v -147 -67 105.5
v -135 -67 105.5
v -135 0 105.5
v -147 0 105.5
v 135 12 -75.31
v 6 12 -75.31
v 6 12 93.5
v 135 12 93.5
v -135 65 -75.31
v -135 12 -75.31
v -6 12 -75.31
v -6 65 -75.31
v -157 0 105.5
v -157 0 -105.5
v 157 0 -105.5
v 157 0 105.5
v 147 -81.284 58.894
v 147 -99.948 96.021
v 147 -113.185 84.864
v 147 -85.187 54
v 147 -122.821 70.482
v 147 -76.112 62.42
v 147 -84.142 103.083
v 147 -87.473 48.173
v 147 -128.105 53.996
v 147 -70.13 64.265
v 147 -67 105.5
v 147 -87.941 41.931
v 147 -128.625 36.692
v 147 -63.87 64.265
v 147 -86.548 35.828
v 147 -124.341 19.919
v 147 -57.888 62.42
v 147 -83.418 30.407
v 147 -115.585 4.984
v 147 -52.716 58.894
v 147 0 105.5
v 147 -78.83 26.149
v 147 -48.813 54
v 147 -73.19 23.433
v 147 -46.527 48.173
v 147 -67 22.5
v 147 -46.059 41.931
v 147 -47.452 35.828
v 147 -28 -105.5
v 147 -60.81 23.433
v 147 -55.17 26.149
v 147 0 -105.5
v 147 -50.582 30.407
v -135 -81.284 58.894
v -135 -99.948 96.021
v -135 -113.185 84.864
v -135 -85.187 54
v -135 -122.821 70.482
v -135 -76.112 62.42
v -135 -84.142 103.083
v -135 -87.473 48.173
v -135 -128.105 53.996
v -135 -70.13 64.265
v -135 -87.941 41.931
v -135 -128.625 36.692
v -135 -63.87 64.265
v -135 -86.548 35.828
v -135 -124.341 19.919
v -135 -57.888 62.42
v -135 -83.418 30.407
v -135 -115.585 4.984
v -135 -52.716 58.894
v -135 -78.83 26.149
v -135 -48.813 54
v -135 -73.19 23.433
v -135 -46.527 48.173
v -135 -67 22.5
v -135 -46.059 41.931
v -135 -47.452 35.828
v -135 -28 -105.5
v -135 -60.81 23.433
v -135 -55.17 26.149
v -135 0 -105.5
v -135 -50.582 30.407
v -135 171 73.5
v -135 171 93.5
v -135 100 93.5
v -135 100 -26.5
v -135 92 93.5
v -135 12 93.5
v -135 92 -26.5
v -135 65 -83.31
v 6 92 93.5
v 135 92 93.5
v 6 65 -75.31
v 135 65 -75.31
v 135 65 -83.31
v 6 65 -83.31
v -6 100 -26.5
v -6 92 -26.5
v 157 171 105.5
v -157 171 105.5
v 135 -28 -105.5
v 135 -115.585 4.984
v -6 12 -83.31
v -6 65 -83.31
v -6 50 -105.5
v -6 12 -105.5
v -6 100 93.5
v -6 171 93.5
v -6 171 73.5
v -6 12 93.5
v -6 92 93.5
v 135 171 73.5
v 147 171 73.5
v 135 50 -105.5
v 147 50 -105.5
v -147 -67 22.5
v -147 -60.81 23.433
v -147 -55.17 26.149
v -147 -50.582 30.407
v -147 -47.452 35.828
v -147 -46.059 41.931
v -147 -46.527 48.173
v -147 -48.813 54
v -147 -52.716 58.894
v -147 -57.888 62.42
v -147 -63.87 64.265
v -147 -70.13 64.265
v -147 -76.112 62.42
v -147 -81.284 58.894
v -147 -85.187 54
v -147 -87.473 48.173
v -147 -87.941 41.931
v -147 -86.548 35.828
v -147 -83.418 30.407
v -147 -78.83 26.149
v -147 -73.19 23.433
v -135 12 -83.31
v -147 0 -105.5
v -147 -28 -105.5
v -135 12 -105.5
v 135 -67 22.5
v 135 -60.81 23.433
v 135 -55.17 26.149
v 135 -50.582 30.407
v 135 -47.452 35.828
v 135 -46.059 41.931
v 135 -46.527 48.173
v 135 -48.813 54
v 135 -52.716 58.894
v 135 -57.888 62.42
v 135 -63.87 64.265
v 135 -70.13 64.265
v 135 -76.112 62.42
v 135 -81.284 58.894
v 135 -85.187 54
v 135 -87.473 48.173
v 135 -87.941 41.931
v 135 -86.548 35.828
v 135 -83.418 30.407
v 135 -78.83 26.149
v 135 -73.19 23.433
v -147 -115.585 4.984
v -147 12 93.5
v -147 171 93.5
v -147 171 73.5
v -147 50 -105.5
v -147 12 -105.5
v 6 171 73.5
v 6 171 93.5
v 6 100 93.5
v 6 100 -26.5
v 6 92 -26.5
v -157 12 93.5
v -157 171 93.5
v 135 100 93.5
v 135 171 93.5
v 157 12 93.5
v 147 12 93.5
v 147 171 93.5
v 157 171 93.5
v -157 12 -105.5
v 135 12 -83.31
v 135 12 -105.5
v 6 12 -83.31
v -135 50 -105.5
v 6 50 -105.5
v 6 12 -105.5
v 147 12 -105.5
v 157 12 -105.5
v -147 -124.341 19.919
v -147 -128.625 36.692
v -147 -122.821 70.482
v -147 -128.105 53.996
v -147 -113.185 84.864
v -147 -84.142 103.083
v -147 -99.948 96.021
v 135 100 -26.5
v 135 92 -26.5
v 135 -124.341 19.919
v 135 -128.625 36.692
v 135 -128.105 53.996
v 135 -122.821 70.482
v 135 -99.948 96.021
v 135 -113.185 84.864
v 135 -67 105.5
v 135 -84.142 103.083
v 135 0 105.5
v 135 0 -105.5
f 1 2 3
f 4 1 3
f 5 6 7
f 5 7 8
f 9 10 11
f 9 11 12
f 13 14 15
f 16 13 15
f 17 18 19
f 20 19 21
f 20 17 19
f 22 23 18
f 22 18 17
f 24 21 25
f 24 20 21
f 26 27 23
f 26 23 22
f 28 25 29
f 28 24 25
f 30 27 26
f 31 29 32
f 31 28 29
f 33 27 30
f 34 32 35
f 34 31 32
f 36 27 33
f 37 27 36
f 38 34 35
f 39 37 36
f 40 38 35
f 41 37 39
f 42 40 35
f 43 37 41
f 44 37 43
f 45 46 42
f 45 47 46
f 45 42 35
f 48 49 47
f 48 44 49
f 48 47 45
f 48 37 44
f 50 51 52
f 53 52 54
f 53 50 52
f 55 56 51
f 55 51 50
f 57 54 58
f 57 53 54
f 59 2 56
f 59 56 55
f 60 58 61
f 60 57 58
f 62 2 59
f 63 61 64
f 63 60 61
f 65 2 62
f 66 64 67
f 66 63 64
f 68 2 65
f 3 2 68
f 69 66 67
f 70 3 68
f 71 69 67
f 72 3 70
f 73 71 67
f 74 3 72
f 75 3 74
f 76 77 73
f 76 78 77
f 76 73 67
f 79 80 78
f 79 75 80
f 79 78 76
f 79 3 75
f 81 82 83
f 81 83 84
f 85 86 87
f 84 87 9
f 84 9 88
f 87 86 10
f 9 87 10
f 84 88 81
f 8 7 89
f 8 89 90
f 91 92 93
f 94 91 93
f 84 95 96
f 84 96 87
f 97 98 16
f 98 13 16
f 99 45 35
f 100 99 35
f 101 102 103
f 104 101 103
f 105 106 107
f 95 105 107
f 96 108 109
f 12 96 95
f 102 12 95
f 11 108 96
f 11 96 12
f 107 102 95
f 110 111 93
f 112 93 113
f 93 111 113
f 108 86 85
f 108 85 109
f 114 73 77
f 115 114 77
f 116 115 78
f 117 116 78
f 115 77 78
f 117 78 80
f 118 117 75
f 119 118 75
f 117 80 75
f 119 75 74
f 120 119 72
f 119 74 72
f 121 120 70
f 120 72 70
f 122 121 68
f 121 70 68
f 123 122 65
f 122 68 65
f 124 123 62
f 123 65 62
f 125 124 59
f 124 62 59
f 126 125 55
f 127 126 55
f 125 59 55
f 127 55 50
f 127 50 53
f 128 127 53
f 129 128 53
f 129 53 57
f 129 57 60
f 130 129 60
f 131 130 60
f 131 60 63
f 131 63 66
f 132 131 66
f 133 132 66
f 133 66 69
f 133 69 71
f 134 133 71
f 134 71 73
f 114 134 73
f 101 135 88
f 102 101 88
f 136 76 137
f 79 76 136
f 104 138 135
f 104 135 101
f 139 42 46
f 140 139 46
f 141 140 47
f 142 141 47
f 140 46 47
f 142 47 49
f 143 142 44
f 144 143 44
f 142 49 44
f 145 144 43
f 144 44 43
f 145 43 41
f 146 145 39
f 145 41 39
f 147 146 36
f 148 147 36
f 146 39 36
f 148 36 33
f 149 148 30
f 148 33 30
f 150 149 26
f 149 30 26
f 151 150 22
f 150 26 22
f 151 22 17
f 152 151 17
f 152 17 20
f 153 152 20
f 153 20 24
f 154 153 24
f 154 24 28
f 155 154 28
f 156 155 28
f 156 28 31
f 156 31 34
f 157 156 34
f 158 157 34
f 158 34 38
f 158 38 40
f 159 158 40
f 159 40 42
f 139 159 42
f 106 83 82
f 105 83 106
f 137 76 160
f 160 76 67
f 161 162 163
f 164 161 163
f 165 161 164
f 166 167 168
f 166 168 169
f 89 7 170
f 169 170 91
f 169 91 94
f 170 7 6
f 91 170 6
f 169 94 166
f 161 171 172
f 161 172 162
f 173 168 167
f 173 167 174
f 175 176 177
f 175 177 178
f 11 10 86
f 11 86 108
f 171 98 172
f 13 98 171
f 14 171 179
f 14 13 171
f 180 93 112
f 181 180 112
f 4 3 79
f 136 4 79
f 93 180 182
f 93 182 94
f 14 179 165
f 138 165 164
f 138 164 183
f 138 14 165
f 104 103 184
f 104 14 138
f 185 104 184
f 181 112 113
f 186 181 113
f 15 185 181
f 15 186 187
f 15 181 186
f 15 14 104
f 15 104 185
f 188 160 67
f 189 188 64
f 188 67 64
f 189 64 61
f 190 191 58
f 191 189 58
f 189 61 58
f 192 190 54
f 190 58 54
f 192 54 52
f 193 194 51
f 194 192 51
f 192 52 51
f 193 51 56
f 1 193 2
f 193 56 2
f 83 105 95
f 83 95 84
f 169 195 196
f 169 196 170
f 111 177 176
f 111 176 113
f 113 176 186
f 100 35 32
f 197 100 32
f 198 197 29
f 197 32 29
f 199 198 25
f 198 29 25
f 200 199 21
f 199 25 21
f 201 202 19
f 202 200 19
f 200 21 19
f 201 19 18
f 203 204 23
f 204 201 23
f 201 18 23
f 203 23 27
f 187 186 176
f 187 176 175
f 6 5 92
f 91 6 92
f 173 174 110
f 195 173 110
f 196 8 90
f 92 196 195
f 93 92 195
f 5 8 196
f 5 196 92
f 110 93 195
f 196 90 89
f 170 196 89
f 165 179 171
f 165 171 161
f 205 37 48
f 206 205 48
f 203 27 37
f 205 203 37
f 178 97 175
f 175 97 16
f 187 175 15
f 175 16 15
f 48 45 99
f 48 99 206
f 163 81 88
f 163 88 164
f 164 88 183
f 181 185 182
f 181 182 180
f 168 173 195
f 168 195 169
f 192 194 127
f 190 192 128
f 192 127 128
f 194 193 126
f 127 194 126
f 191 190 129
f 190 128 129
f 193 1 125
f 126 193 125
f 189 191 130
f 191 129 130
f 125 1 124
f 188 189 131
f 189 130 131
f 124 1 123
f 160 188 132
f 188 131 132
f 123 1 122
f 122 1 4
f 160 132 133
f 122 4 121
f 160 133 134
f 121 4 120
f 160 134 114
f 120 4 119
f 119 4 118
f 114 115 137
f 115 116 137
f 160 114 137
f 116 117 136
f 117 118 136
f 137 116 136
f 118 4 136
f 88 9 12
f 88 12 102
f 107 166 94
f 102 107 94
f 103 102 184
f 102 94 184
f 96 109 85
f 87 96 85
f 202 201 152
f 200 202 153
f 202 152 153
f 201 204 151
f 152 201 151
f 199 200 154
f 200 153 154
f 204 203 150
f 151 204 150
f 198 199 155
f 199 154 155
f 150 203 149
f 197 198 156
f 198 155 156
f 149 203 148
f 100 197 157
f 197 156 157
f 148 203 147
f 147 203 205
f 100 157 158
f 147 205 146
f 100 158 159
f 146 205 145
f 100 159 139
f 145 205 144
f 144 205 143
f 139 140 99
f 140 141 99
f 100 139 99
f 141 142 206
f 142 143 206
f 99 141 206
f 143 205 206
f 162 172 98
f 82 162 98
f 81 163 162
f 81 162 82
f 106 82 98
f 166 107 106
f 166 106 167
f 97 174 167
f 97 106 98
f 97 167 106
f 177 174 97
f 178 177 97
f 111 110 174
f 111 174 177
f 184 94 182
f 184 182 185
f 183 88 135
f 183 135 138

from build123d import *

# Parameters (mm, degrees)
SKETCH_7_W             = 314
SKETCH_7_H             = 211
EXTRUDE_7_DEPTH        = 12
SKETCH_8_W             = 211
SKETCH_8_H             = 150
EXTRUDE_8_DEPTH        = 314
SKETCH_9_R             = 21
CUT_EXTRUDE_1_DEPTH    = 364.629275499
SKETCH_10_W            = 270
SKETCH_10_H            = 211
SKETCH_10_W_2          = 10
CUT_EXTRUDE_2_DEPTH    = 229.954689841
SKETCH_11_W            = 314
SKETCH_11_H            = 12
EXTRUDE_9_DEPTH        = 159
SKETCH_13_W            = 12
SKETCH_13_H            = 199
EXTRUDE_11_DEPTH       = 159
PATTERN_LINEAR_2_COUNT = 2
PATTERN_LINEAR_2_PITCH = 141
PATTERN_LINEAR_3_COUNT = 2
PATTERN_LINEAR_3_PITCH = 141
CUT_EXTRUDE_3_DEPTH    = 373.783113888
SKETCH_15_W            = 8
SKETCH_15_H            = 53
EXTRUDE_12_DEPTH       = 129
SKETCH_16_W            = 129
SKETCH_16_H            = 8
EXTRUDE_13_DEPTH       = 120


with BuildPart() as part:
    # 草图7 → 凸台-拉伸7 (new body)
    with BuildSketch(Plane(origin=(0, 0, 0), x_dir=(1, 0, 0), z_dir=(0, 1, 0))):
        Rectangle(SKETCH_7_W, SKETCH_7_H)
    extrude(amount=EXTRUDE_7_DEPTH)

    # 草图11 → 凸台-拉伸9 (add)
    with BuildSketch(Plane(origin=(0, 12, 0), x_dir=(1, 0, 0), z_dir=(0, 1, 0))):
        with Locations((0, -99.5)):
            Rectangle(SKETCH_11_W, SKETCH_11_H)
    extrude(amount=EXTRUDE_9_DEPTH)

    # 草图13 → 凸台-拉伸11 (add)
    with BuildSketch(Plane(origin=(0, 12, 0), x_dir=(1, 0, 0), z_dir=(0, 1, 0))):
        with Locations((0, 6)):
            Rectangle(SKETCH_13_W, SKETCH_13_H)
    extrude_11 = extrude(amount=EXTRUDE_11_DEPTH)

    # 阵列(线性)2: 凸台-拉伸11 ×2
    with Locations(*[(-i * PATTERN_LINEAR_2_PITCH, 0, 0) for i in range(1, PATTERN_LINEAR_2_COUNT)]):
        add(extrude_11)

    # 阵列(线性)3: 凸台-拉伸11 ×2
    with Locations(*[(i * PATTERN_LINEAR_3_PITCH, 0, 0) for i in range(1, PATTERN_LINEAR_3_COUNT)]):
        add(extrude_11)

    # 草图14 → 切除-拉伸3 (cut, through all)
    with BuildSketch(Plane(origin=(157, 0, 0), x_dir=(0, 0, -1), z_dir=(1, 0, 0))):
        Polygon((-73.5, 171), (105.5, 50), (105.5, 171), align=None)
    extrude(amount=-CUT_EXTRUDE_3_DEPTH, mode=Mode.SUBTRACT)

    # 草图15 → 凸台-拉伸12 (add)
    with BuildSketch(Plane(origin=(-135, 0, 0), x_dir=(0, 0, -1), z_dir=(1, 0, 0))):
        with Locations((79.309917355, 38.5)):
            Rectangle(SKETCH_15_W, SKETCH_15_H)
    extrude_12 = extrude(amount=EXTRUDE_12_DEPTH)

    # 镜向1: 凸台-拉伸12 across plane
    add(extrude_12.mirror(Plane(origin=(0, 0, 0), x_dir=(0, 0, 1), z_dir=(1, 0, 0))))

    # 草图16 → 凸台-拉伸13 (add)
    with BuildSketch(Plane(origin=(0, 0, 93.5), x_dir=(-1, 0, 0), z_dir=(0, 0, -1))):
        with Locations((-70.5, 96)):
            Rectangle(SKETCH_16_W, SKETCH_16_H)
        with Locations((70.5, 96)):
            Rectangle(SKETCH_16_W, SKETCH_16_H)
    extrude(amount=EXTRUDE_13_DEPTH)


with BuildPart() as body_2:
    # 草图8 → 凸台-拉伸8 (new body)
    with BuildSketch(Plane(origin=(157, 0, 0), x_dir=(0, 0, -1), z_dir=(1, 0, 0))):
        with Locations((0, -75)):
            Rectangle(SKETCH_8_W, SKETCH_8_H)
    extrude(amount=-EXTRUDE_8_DEPTH)

    # 草图9 → 切除-拉伸1 (cut, through all)
    with BuildSketch(Plane(origin=(157, 0, 0), x_dir=(0, 0, -1), z_dir=(1, 0, 0))):
        with Locations((-43.5, -67)):
            Circle(SKETCH_9_R)
        with BuildLine():
            Line((105.5, -28), (-4.98434889, -115.585436291))
            ThreePointArc((-4.98434889, -115.585436291), (-70.481749676, -122.821010242), (-105.5, -67))
            Line((-105.5, -67), (-105.5, -150))
            Line((-105.5, -150), (105.5, -150))
            Line((105.5, -150), (105.5, -28))
        make_face()
    extrude(amount=-CUT_EXTRUDE_1_DEPTH, mode=Mode.SUBTRACT)

    # 草图10 → 切除-拉伸2 (cut, through all)
    with BuildSketch(Plane(origin=(0, 0, 0), x_dir=(1, 0, 0), z_dir=(0, 1, 0))):
        Rectangle(SKETCH_10_W, SKETCH_10_H)
        with Locations((-152, 0)):
            Rectangle(SKETCH_10_W_2, SKETCH_10_H)
        with Locations((152, 0)):
            Rectangle(SKETCH_10_W_2, SKETCH_10_H)
    extrude(amount=-CUT_EXTRUDE_2_DEPTH, mode=Mode.SUBTRACT)


with BuildPart() as cut_extrude_2_piece_1:
    # of the separate pieces the step leaves, piece 1, a body of its own (cut_extrude_2_pieces)
    add(body_2.part.solids().sort_by_distance((147, 0, 105.5))[0])


with BuildPart() as cut_extrude_2_piece_2:
    # of the separate pieces the step leaves, piece 2, a body of its own (cut_extrude_2_pieces)
    add(body_2.part.solids().sort_by_distance((-135, 0, 105.5))[0])


solid = Compound([part.part, cut_extrude_2_piece_1.part, cut_extrude_2_piece_2.part])
